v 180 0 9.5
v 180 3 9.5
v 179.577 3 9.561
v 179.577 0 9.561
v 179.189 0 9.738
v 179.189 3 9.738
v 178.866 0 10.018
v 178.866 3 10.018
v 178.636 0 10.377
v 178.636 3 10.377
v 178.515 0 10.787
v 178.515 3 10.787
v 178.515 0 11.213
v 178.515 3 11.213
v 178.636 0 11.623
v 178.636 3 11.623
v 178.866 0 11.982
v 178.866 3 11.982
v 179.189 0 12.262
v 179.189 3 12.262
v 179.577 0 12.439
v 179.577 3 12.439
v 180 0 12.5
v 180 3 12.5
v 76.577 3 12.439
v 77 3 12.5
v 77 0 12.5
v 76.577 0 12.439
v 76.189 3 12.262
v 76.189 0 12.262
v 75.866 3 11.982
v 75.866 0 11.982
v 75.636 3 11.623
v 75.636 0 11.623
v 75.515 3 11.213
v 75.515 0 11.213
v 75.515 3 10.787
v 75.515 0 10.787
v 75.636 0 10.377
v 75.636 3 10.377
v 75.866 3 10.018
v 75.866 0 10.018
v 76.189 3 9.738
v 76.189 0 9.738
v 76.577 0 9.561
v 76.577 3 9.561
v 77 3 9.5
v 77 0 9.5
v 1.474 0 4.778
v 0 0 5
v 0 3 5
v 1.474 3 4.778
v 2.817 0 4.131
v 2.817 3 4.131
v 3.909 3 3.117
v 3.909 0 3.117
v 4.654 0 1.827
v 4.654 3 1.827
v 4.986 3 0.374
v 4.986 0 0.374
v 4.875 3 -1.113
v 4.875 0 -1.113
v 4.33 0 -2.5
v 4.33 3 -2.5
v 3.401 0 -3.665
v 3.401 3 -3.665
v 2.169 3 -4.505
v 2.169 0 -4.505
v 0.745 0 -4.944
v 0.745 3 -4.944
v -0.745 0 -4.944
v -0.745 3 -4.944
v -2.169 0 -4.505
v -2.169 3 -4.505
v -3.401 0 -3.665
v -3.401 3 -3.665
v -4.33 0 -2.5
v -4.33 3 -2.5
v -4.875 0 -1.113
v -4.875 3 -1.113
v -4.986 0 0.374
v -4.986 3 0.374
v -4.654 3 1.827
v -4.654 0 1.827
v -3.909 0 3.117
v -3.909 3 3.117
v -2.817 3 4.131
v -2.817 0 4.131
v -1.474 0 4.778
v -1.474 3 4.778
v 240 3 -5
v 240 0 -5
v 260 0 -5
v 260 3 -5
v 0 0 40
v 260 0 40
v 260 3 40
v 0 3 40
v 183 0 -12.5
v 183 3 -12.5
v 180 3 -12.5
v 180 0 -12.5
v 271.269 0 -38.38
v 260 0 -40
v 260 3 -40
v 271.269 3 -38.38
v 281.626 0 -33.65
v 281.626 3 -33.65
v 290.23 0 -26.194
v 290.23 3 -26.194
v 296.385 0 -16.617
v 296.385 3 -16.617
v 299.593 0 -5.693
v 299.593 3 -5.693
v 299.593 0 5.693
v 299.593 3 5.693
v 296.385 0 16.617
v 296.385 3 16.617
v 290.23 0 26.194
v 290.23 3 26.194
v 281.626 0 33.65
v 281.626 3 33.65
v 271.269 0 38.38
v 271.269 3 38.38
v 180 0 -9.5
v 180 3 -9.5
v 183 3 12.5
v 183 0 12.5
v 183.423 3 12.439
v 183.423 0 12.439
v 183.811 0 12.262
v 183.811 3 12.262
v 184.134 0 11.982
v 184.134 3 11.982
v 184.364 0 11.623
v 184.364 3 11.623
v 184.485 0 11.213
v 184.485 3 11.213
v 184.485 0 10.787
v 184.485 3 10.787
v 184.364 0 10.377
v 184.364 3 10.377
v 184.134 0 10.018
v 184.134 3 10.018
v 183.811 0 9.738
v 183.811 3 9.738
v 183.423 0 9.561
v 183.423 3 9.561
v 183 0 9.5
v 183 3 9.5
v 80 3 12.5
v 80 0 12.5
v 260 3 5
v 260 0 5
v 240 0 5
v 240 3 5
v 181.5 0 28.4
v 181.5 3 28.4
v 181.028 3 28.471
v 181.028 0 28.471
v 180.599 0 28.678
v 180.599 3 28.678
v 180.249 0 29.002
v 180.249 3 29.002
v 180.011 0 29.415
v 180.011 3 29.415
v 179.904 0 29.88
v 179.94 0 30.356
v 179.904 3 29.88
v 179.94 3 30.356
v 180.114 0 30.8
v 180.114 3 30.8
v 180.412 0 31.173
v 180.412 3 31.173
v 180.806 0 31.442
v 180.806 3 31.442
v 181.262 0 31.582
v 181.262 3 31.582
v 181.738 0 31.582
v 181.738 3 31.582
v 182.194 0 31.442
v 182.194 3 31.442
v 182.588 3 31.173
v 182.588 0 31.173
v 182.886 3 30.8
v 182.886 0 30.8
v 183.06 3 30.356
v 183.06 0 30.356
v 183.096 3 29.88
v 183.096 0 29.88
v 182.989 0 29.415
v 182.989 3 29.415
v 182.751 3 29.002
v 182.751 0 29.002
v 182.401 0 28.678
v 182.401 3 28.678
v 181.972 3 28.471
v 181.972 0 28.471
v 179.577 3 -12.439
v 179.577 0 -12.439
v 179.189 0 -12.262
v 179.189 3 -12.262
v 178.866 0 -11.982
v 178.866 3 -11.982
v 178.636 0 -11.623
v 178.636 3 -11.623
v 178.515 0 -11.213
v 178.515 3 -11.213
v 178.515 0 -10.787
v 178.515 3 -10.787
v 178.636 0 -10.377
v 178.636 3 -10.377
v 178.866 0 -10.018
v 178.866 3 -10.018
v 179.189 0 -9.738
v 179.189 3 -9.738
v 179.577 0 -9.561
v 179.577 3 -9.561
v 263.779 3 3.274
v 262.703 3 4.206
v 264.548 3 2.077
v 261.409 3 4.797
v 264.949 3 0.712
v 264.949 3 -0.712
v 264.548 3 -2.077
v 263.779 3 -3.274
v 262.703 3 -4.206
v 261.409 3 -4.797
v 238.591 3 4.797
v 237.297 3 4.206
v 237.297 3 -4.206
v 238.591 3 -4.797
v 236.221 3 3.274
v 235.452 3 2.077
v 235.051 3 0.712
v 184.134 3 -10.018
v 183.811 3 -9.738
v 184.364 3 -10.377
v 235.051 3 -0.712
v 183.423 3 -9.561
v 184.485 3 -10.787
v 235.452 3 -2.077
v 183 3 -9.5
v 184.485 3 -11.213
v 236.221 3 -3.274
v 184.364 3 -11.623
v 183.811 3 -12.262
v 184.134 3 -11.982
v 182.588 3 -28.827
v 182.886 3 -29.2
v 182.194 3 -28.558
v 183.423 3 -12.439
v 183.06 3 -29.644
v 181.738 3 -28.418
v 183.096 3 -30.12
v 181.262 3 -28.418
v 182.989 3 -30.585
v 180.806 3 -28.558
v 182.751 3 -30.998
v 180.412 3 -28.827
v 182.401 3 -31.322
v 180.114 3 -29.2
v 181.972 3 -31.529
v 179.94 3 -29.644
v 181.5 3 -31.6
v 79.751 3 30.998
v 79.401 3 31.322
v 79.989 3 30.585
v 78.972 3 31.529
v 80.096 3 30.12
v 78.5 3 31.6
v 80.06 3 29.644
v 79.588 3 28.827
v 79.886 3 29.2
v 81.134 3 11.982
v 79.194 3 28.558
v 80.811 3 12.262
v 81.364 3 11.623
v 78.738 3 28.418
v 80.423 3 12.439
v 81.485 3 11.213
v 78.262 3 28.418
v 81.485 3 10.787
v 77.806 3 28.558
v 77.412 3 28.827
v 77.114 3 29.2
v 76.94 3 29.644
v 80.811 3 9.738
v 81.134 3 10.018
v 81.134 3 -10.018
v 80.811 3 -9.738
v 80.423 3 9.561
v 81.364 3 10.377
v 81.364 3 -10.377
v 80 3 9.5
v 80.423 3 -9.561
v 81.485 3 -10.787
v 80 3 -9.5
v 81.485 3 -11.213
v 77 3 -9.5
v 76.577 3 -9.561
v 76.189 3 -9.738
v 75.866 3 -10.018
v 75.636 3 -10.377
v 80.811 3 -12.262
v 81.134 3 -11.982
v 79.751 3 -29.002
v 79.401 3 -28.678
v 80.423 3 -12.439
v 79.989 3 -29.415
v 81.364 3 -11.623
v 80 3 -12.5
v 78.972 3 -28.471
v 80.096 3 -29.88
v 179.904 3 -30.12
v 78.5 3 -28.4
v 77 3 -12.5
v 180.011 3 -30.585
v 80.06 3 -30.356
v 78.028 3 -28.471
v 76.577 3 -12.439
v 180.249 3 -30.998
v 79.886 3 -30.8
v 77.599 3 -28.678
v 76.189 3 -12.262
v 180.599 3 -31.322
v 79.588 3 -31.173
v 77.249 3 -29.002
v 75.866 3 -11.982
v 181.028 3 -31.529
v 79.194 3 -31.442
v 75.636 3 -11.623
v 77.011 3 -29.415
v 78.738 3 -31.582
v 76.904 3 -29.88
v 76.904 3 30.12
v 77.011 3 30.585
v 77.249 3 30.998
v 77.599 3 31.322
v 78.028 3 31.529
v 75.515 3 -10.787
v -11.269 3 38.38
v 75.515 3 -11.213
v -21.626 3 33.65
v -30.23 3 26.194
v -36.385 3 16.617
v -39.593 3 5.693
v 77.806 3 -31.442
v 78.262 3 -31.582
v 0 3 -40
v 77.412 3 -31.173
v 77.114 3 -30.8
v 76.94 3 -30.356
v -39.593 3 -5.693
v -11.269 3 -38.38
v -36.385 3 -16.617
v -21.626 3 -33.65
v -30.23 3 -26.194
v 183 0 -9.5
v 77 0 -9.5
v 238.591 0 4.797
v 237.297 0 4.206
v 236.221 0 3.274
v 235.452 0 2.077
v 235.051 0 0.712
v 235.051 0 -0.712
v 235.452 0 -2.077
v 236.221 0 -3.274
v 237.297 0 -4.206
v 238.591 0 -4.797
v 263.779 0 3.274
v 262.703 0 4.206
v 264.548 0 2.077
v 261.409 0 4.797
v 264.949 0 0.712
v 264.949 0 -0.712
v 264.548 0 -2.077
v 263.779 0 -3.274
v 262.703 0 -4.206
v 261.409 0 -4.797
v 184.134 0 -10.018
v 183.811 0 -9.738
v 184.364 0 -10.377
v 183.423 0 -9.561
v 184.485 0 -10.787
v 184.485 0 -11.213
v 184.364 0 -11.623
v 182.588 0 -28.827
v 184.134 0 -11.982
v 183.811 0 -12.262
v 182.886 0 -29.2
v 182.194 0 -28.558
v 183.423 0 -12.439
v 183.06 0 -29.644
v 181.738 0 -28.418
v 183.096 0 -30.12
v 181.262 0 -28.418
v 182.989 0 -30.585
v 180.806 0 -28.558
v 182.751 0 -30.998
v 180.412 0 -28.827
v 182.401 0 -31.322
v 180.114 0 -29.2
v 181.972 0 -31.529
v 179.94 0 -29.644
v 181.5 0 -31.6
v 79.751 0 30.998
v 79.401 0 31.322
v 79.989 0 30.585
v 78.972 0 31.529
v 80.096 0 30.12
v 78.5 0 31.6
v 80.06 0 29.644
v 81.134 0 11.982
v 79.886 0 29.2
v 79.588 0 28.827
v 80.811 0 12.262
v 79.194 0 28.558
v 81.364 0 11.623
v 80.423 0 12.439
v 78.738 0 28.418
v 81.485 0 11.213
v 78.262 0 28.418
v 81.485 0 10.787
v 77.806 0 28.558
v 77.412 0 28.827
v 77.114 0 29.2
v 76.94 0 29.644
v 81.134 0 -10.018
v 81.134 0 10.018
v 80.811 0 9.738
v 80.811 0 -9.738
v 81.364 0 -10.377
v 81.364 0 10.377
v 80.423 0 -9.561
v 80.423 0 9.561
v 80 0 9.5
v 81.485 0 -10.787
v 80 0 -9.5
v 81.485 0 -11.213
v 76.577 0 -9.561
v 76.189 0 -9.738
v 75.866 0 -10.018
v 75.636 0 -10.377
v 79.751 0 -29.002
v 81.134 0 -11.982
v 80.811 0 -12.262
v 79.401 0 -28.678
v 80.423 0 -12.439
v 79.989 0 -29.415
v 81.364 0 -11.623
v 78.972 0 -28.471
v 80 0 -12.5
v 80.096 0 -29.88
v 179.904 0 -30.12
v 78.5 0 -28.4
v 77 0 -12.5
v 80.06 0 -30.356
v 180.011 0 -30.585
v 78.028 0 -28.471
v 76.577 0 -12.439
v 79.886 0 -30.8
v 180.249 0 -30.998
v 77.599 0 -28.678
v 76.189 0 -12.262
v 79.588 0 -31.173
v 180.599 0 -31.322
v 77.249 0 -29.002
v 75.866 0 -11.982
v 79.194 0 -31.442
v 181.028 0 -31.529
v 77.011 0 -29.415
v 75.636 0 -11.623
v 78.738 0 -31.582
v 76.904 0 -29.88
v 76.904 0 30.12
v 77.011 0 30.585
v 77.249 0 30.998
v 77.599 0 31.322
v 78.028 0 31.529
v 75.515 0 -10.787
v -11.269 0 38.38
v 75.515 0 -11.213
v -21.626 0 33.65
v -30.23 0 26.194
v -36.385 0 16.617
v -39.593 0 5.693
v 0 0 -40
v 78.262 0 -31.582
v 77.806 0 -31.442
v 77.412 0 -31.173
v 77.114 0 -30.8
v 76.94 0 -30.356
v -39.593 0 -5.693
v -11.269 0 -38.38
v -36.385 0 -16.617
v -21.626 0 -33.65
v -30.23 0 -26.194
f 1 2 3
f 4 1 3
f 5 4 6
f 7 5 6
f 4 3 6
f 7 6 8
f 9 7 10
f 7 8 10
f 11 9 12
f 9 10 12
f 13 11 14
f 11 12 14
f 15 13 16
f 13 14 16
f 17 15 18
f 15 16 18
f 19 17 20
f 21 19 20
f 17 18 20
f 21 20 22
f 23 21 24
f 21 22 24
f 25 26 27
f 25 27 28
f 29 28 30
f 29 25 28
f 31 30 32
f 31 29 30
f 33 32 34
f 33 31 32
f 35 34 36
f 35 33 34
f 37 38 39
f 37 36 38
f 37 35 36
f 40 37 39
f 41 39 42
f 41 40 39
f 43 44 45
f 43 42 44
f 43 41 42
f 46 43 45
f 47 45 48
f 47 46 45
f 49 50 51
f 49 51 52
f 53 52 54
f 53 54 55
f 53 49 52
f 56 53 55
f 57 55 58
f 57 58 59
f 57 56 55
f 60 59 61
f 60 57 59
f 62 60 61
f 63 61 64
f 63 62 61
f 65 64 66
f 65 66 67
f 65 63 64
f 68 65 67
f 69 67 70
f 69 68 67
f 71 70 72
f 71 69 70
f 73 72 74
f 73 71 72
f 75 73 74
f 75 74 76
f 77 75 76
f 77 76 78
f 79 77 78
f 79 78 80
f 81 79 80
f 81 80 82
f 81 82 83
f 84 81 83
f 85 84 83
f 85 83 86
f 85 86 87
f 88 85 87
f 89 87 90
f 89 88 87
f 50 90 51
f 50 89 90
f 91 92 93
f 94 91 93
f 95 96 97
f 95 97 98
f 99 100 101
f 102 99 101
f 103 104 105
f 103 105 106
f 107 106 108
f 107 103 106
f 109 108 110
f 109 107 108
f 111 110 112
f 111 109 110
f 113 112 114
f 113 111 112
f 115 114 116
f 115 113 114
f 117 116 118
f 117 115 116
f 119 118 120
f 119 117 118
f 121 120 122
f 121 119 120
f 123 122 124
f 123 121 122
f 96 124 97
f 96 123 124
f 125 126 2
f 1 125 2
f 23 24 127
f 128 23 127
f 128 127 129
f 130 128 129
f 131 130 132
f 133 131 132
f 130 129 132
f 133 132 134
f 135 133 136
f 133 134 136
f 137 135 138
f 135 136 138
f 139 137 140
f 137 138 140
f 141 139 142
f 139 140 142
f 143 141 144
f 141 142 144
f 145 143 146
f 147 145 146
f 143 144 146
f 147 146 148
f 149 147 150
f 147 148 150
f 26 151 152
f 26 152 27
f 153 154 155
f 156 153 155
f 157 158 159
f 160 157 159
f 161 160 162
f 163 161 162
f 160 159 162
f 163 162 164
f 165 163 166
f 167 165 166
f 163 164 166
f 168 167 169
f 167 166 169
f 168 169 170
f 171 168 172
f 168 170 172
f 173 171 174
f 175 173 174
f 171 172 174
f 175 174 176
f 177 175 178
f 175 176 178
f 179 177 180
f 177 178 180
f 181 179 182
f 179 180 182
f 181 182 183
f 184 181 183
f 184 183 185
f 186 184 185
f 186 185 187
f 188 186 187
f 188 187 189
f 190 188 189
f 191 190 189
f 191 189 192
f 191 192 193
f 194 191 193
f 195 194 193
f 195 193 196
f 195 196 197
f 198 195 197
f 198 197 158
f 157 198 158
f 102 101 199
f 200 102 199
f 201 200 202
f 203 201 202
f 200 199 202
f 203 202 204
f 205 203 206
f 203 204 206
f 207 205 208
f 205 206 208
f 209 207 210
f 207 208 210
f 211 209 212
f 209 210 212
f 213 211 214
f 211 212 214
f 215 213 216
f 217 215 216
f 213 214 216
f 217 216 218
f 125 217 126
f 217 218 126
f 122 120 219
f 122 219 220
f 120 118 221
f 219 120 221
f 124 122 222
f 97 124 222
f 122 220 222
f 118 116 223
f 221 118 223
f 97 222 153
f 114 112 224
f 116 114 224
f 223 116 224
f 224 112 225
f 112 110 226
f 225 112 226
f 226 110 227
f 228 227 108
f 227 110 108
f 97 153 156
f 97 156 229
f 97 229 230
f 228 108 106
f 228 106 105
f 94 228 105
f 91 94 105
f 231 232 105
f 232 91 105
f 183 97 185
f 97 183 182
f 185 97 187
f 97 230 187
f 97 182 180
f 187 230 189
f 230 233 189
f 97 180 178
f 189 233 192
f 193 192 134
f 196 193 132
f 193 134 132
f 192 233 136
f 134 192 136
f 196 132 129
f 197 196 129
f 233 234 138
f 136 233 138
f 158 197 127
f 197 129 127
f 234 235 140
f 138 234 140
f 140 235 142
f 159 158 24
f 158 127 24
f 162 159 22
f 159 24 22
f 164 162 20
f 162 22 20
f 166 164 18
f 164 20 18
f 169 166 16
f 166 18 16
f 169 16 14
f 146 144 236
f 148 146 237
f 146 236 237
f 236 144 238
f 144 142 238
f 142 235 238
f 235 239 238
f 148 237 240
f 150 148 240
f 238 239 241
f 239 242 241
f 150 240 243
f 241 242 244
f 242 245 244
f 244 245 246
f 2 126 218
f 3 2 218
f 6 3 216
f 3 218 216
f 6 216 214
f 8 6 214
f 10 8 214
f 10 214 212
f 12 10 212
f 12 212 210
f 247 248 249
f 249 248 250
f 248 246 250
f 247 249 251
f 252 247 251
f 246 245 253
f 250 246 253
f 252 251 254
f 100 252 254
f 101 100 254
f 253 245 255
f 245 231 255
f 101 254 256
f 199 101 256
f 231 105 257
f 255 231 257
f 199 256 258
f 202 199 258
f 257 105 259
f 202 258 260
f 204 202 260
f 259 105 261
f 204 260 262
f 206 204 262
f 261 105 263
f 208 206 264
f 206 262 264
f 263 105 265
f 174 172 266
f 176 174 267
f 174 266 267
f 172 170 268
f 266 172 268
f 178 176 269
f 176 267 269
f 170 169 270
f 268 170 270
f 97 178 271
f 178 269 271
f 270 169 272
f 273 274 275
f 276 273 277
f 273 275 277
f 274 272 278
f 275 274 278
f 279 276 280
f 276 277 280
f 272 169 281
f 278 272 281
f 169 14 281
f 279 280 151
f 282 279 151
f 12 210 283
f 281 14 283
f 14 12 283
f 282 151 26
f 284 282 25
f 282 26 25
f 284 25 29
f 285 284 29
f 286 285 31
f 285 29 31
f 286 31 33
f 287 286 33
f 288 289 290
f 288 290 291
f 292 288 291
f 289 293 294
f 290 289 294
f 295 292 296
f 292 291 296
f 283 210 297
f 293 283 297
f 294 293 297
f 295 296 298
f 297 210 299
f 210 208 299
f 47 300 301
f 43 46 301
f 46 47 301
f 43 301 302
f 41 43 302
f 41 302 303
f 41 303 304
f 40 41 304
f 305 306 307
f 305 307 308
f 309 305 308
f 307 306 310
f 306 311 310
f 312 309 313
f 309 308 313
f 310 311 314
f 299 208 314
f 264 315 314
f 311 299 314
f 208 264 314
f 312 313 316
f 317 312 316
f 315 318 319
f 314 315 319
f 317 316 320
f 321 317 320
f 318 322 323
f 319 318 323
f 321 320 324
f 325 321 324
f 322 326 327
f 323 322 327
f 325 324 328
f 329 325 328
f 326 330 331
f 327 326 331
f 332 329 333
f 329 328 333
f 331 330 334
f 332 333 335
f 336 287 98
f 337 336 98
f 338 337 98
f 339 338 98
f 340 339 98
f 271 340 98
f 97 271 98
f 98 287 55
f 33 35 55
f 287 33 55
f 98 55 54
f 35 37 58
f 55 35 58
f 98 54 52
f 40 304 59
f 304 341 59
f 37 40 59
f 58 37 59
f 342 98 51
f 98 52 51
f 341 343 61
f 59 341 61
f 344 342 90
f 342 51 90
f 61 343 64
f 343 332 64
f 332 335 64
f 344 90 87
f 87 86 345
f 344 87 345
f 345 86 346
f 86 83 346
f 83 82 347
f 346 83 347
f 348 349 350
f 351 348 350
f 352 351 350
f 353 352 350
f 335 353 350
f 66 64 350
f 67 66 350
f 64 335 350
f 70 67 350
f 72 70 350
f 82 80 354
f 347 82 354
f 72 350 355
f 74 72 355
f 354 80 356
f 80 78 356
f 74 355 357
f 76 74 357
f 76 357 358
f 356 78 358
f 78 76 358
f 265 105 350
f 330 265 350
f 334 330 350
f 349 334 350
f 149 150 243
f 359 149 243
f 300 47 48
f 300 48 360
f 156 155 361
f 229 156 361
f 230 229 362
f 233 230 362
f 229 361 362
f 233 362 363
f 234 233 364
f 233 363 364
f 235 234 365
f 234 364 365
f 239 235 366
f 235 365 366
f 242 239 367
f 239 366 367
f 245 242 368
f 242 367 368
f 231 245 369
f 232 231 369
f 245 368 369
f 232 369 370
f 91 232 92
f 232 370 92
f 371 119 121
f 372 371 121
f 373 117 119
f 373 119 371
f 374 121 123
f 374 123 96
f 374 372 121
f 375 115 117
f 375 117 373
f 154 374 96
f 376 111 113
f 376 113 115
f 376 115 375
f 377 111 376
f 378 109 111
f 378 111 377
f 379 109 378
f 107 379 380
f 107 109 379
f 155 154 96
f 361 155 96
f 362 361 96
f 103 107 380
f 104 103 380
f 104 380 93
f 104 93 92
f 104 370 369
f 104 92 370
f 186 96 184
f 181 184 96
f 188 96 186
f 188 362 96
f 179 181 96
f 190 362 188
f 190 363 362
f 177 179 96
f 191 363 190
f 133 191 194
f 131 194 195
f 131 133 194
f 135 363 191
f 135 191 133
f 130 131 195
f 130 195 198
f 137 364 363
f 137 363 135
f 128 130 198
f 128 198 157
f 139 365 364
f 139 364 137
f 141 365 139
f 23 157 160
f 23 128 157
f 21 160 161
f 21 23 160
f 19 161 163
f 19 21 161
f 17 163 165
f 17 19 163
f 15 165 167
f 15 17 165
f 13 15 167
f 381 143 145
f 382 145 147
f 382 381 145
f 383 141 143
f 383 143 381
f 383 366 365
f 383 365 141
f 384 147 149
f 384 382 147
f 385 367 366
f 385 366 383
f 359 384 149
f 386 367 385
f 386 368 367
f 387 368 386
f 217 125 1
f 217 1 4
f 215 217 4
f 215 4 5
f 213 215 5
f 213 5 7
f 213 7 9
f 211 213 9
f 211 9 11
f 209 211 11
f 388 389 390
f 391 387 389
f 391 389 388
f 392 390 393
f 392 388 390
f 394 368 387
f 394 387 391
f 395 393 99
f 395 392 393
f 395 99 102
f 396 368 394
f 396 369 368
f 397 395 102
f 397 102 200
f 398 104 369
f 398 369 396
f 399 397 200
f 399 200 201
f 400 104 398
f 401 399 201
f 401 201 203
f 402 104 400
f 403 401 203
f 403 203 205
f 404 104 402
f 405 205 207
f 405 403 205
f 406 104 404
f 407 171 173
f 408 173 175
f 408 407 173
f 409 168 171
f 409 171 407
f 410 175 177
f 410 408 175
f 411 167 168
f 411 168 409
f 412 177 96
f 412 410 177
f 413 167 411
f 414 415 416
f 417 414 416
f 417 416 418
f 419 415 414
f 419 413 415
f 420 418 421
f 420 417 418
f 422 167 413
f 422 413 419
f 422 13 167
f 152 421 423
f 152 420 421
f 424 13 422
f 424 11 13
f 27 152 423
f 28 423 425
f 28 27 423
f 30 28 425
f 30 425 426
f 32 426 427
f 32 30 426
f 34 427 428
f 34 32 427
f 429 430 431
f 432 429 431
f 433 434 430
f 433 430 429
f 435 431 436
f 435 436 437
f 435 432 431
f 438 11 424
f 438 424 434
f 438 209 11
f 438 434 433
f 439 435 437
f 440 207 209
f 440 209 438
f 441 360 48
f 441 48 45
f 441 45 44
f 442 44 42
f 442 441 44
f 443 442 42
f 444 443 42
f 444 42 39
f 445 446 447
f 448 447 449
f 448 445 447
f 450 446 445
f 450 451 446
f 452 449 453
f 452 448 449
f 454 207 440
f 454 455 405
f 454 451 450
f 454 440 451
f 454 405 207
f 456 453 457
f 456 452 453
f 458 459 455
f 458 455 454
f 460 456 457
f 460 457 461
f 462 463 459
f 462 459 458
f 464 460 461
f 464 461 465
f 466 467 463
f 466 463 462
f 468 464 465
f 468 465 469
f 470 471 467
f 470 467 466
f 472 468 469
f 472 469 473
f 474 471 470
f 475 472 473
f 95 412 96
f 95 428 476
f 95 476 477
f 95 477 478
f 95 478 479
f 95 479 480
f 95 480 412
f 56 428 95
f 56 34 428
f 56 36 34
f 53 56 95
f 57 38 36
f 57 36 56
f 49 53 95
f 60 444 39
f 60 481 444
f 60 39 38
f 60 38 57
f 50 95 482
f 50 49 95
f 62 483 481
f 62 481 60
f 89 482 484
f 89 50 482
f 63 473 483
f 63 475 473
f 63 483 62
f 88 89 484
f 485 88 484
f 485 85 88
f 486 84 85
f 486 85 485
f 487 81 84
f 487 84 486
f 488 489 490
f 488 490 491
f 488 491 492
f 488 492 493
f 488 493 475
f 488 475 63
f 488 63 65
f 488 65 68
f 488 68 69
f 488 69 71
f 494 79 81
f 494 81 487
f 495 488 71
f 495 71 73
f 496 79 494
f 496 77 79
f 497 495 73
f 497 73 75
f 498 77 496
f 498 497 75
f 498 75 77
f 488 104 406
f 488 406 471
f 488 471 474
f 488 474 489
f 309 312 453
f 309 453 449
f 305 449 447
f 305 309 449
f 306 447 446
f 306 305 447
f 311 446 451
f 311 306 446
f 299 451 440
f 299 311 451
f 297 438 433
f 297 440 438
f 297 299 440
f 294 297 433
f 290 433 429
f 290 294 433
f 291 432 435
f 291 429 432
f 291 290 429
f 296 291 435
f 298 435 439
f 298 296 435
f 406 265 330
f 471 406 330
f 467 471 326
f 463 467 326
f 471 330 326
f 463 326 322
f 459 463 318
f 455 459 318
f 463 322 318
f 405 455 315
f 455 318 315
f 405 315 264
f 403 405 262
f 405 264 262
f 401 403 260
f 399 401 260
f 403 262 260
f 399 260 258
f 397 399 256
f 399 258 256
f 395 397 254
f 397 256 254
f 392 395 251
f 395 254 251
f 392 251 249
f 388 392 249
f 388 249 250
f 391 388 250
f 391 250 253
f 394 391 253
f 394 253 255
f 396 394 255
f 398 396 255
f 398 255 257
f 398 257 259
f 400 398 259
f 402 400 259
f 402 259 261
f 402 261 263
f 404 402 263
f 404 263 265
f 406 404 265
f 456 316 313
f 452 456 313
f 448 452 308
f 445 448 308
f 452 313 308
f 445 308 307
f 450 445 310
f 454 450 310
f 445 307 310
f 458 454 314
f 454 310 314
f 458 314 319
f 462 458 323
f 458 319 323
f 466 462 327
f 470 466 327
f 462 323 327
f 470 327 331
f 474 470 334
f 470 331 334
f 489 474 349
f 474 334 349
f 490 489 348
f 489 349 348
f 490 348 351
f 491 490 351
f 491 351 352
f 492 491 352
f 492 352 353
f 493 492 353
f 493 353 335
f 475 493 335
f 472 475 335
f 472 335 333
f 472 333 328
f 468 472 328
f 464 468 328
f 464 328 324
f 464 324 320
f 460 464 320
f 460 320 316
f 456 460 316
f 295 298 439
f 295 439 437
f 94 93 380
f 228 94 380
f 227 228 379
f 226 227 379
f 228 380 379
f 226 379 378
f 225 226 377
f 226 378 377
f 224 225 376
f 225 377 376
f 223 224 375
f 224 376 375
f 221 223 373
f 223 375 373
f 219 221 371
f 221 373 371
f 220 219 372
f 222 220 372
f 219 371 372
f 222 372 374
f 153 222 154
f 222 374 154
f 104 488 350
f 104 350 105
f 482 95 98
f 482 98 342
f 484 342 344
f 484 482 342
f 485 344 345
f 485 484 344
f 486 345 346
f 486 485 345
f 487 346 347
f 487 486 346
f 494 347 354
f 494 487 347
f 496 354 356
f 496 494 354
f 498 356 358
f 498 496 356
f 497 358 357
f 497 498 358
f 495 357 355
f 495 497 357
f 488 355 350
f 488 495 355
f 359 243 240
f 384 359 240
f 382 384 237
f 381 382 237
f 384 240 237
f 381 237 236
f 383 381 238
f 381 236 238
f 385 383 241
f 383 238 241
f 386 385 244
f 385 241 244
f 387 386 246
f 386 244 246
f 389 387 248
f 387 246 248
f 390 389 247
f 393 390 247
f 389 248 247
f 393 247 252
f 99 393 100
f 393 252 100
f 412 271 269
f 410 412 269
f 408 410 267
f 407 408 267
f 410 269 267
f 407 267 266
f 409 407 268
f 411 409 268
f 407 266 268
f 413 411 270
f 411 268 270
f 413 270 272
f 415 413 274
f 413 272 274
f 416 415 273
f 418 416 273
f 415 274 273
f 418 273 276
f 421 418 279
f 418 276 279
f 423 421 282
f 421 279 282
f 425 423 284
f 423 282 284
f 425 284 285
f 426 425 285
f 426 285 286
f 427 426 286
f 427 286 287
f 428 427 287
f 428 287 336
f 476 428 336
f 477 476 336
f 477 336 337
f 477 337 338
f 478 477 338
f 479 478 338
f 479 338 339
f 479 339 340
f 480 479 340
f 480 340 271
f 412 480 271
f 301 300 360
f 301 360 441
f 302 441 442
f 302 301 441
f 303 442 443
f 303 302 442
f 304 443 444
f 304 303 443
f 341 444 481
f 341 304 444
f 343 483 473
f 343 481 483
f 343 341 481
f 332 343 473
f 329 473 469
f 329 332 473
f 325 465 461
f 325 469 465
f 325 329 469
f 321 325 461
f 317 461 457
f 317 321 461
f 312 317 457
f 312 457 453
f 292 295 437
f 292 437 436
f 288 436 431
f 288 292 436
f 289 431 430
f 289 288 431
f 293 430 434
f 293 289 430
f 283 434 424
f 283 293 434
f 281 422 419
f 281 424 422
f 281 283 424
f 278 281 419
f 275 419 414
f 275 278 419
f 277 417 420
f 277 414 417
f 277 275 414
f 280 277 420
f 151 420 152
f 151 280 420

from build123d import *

# Parameters (mm, degrees)
SKETCH1_R           = 5
BOSS_EXTRUDE1_DEPTH = 3
SKETCH2_R           = 1.6
CUT_EXTRUDE1_DEPTH  = 303.669787062


with BuildPart() as part:
    # Sketch1 → Boss-Extrude1 (new body)
    with BuildSketch(Plane(origin=(0, 0, 0), x_dir=(1, 0, 0), z_dir=(0, 1, 0))):
        with BuildLine():
            Line((0, 40), (260, 40))
            ThreePointArc((260, 40), (300, 0), (260, -40))
            Line((260, -40), (0, -40))
            ThreePointArc((0, -40), (-40, 0), (0, 40))
        make_face()
        with Locations(Location((0, 0, 0), (0, 0, 270))):
            Circle(SKETCH1_R, mode=Mode.SUBTRACT)
        with BuildLine():
            Line((260, -5), (240, -5))
            ThreePointArc((240, -5), (235, 0), (240, 5))
            Line((240, 5), (260, 5))
            ThreePointArc((260, 5), (265, 0), (260, -5))
        make_face(mode=Mode.SUBTRACT)
    extrude(amount=BOSS_EXTRUDE1_DEPTH)

    # Sketch2 → Cut-Extrude1 (cut, through all)
    with BuildSketch(Plane(origin=(0, 3, 0), x_dir=(1, 0, 0), z_dir=(0, 1, 0))):
        with Locations(Location((78.5, 30, 0), (0, 0, 270))):
            Circle(SKETCH2_R)
        with Locations(Location((78.5, -30, 0), (0, 0, 270))):
            Circle(SKETCH2_R)
        with Locations(Location((181.5, -30, 0), (0, 0, 90))):
            Circle(SKETCH2_R)
        with Locations(Location((181.5, 30, 0), (0, 0, 90))):
            Circle(SKETCH2_R)
        with BuildLine():
            Line((80, 9.5), (80, -9.5))
            ThreePointArc((80, -9.5), (81.5, -11), (80, -12.5))
            Line((80, -12.5), (77, -12.5))
            ThreePointArc((77, -12.5), (75.5, -11), (77, -9.5))
            Line((77, -9.5), (77, 9.5))
            ThreePointArc((77, 9.5), (75.5, 11), (77, 12.5))
            Line((77, 12.5), (80, 12.5))
            ThreePointArc((80, 12.5), (81.5, 11), (80, 9.5))
        make_face()
        with BuildLine():
            Line((183, 12.5), (180, 12.5))
            ThreePointArc((180, 12.5), (178.5, 11), (180, 9.5))
            Line((180, 9.5), (180, -9.5))
            ThreePointArc((180, -9.5), (178.5, -11), (180, -12.5))
            Line((180, -12.5), (183, -12.5))
            ThreePointArc((183, -12.5), (184.5, -11), (183, -9.5))
            Line((183, -9.5), (183, 9.5))
            ThreePointArc((183, 9.5), (184.5, 11), (183, 12.5))
        make_face()
    extrude(amount=-CUT_EXTRUDE1_DEPTH, mode=Mode.SUBTRACT)


solid = part.part
